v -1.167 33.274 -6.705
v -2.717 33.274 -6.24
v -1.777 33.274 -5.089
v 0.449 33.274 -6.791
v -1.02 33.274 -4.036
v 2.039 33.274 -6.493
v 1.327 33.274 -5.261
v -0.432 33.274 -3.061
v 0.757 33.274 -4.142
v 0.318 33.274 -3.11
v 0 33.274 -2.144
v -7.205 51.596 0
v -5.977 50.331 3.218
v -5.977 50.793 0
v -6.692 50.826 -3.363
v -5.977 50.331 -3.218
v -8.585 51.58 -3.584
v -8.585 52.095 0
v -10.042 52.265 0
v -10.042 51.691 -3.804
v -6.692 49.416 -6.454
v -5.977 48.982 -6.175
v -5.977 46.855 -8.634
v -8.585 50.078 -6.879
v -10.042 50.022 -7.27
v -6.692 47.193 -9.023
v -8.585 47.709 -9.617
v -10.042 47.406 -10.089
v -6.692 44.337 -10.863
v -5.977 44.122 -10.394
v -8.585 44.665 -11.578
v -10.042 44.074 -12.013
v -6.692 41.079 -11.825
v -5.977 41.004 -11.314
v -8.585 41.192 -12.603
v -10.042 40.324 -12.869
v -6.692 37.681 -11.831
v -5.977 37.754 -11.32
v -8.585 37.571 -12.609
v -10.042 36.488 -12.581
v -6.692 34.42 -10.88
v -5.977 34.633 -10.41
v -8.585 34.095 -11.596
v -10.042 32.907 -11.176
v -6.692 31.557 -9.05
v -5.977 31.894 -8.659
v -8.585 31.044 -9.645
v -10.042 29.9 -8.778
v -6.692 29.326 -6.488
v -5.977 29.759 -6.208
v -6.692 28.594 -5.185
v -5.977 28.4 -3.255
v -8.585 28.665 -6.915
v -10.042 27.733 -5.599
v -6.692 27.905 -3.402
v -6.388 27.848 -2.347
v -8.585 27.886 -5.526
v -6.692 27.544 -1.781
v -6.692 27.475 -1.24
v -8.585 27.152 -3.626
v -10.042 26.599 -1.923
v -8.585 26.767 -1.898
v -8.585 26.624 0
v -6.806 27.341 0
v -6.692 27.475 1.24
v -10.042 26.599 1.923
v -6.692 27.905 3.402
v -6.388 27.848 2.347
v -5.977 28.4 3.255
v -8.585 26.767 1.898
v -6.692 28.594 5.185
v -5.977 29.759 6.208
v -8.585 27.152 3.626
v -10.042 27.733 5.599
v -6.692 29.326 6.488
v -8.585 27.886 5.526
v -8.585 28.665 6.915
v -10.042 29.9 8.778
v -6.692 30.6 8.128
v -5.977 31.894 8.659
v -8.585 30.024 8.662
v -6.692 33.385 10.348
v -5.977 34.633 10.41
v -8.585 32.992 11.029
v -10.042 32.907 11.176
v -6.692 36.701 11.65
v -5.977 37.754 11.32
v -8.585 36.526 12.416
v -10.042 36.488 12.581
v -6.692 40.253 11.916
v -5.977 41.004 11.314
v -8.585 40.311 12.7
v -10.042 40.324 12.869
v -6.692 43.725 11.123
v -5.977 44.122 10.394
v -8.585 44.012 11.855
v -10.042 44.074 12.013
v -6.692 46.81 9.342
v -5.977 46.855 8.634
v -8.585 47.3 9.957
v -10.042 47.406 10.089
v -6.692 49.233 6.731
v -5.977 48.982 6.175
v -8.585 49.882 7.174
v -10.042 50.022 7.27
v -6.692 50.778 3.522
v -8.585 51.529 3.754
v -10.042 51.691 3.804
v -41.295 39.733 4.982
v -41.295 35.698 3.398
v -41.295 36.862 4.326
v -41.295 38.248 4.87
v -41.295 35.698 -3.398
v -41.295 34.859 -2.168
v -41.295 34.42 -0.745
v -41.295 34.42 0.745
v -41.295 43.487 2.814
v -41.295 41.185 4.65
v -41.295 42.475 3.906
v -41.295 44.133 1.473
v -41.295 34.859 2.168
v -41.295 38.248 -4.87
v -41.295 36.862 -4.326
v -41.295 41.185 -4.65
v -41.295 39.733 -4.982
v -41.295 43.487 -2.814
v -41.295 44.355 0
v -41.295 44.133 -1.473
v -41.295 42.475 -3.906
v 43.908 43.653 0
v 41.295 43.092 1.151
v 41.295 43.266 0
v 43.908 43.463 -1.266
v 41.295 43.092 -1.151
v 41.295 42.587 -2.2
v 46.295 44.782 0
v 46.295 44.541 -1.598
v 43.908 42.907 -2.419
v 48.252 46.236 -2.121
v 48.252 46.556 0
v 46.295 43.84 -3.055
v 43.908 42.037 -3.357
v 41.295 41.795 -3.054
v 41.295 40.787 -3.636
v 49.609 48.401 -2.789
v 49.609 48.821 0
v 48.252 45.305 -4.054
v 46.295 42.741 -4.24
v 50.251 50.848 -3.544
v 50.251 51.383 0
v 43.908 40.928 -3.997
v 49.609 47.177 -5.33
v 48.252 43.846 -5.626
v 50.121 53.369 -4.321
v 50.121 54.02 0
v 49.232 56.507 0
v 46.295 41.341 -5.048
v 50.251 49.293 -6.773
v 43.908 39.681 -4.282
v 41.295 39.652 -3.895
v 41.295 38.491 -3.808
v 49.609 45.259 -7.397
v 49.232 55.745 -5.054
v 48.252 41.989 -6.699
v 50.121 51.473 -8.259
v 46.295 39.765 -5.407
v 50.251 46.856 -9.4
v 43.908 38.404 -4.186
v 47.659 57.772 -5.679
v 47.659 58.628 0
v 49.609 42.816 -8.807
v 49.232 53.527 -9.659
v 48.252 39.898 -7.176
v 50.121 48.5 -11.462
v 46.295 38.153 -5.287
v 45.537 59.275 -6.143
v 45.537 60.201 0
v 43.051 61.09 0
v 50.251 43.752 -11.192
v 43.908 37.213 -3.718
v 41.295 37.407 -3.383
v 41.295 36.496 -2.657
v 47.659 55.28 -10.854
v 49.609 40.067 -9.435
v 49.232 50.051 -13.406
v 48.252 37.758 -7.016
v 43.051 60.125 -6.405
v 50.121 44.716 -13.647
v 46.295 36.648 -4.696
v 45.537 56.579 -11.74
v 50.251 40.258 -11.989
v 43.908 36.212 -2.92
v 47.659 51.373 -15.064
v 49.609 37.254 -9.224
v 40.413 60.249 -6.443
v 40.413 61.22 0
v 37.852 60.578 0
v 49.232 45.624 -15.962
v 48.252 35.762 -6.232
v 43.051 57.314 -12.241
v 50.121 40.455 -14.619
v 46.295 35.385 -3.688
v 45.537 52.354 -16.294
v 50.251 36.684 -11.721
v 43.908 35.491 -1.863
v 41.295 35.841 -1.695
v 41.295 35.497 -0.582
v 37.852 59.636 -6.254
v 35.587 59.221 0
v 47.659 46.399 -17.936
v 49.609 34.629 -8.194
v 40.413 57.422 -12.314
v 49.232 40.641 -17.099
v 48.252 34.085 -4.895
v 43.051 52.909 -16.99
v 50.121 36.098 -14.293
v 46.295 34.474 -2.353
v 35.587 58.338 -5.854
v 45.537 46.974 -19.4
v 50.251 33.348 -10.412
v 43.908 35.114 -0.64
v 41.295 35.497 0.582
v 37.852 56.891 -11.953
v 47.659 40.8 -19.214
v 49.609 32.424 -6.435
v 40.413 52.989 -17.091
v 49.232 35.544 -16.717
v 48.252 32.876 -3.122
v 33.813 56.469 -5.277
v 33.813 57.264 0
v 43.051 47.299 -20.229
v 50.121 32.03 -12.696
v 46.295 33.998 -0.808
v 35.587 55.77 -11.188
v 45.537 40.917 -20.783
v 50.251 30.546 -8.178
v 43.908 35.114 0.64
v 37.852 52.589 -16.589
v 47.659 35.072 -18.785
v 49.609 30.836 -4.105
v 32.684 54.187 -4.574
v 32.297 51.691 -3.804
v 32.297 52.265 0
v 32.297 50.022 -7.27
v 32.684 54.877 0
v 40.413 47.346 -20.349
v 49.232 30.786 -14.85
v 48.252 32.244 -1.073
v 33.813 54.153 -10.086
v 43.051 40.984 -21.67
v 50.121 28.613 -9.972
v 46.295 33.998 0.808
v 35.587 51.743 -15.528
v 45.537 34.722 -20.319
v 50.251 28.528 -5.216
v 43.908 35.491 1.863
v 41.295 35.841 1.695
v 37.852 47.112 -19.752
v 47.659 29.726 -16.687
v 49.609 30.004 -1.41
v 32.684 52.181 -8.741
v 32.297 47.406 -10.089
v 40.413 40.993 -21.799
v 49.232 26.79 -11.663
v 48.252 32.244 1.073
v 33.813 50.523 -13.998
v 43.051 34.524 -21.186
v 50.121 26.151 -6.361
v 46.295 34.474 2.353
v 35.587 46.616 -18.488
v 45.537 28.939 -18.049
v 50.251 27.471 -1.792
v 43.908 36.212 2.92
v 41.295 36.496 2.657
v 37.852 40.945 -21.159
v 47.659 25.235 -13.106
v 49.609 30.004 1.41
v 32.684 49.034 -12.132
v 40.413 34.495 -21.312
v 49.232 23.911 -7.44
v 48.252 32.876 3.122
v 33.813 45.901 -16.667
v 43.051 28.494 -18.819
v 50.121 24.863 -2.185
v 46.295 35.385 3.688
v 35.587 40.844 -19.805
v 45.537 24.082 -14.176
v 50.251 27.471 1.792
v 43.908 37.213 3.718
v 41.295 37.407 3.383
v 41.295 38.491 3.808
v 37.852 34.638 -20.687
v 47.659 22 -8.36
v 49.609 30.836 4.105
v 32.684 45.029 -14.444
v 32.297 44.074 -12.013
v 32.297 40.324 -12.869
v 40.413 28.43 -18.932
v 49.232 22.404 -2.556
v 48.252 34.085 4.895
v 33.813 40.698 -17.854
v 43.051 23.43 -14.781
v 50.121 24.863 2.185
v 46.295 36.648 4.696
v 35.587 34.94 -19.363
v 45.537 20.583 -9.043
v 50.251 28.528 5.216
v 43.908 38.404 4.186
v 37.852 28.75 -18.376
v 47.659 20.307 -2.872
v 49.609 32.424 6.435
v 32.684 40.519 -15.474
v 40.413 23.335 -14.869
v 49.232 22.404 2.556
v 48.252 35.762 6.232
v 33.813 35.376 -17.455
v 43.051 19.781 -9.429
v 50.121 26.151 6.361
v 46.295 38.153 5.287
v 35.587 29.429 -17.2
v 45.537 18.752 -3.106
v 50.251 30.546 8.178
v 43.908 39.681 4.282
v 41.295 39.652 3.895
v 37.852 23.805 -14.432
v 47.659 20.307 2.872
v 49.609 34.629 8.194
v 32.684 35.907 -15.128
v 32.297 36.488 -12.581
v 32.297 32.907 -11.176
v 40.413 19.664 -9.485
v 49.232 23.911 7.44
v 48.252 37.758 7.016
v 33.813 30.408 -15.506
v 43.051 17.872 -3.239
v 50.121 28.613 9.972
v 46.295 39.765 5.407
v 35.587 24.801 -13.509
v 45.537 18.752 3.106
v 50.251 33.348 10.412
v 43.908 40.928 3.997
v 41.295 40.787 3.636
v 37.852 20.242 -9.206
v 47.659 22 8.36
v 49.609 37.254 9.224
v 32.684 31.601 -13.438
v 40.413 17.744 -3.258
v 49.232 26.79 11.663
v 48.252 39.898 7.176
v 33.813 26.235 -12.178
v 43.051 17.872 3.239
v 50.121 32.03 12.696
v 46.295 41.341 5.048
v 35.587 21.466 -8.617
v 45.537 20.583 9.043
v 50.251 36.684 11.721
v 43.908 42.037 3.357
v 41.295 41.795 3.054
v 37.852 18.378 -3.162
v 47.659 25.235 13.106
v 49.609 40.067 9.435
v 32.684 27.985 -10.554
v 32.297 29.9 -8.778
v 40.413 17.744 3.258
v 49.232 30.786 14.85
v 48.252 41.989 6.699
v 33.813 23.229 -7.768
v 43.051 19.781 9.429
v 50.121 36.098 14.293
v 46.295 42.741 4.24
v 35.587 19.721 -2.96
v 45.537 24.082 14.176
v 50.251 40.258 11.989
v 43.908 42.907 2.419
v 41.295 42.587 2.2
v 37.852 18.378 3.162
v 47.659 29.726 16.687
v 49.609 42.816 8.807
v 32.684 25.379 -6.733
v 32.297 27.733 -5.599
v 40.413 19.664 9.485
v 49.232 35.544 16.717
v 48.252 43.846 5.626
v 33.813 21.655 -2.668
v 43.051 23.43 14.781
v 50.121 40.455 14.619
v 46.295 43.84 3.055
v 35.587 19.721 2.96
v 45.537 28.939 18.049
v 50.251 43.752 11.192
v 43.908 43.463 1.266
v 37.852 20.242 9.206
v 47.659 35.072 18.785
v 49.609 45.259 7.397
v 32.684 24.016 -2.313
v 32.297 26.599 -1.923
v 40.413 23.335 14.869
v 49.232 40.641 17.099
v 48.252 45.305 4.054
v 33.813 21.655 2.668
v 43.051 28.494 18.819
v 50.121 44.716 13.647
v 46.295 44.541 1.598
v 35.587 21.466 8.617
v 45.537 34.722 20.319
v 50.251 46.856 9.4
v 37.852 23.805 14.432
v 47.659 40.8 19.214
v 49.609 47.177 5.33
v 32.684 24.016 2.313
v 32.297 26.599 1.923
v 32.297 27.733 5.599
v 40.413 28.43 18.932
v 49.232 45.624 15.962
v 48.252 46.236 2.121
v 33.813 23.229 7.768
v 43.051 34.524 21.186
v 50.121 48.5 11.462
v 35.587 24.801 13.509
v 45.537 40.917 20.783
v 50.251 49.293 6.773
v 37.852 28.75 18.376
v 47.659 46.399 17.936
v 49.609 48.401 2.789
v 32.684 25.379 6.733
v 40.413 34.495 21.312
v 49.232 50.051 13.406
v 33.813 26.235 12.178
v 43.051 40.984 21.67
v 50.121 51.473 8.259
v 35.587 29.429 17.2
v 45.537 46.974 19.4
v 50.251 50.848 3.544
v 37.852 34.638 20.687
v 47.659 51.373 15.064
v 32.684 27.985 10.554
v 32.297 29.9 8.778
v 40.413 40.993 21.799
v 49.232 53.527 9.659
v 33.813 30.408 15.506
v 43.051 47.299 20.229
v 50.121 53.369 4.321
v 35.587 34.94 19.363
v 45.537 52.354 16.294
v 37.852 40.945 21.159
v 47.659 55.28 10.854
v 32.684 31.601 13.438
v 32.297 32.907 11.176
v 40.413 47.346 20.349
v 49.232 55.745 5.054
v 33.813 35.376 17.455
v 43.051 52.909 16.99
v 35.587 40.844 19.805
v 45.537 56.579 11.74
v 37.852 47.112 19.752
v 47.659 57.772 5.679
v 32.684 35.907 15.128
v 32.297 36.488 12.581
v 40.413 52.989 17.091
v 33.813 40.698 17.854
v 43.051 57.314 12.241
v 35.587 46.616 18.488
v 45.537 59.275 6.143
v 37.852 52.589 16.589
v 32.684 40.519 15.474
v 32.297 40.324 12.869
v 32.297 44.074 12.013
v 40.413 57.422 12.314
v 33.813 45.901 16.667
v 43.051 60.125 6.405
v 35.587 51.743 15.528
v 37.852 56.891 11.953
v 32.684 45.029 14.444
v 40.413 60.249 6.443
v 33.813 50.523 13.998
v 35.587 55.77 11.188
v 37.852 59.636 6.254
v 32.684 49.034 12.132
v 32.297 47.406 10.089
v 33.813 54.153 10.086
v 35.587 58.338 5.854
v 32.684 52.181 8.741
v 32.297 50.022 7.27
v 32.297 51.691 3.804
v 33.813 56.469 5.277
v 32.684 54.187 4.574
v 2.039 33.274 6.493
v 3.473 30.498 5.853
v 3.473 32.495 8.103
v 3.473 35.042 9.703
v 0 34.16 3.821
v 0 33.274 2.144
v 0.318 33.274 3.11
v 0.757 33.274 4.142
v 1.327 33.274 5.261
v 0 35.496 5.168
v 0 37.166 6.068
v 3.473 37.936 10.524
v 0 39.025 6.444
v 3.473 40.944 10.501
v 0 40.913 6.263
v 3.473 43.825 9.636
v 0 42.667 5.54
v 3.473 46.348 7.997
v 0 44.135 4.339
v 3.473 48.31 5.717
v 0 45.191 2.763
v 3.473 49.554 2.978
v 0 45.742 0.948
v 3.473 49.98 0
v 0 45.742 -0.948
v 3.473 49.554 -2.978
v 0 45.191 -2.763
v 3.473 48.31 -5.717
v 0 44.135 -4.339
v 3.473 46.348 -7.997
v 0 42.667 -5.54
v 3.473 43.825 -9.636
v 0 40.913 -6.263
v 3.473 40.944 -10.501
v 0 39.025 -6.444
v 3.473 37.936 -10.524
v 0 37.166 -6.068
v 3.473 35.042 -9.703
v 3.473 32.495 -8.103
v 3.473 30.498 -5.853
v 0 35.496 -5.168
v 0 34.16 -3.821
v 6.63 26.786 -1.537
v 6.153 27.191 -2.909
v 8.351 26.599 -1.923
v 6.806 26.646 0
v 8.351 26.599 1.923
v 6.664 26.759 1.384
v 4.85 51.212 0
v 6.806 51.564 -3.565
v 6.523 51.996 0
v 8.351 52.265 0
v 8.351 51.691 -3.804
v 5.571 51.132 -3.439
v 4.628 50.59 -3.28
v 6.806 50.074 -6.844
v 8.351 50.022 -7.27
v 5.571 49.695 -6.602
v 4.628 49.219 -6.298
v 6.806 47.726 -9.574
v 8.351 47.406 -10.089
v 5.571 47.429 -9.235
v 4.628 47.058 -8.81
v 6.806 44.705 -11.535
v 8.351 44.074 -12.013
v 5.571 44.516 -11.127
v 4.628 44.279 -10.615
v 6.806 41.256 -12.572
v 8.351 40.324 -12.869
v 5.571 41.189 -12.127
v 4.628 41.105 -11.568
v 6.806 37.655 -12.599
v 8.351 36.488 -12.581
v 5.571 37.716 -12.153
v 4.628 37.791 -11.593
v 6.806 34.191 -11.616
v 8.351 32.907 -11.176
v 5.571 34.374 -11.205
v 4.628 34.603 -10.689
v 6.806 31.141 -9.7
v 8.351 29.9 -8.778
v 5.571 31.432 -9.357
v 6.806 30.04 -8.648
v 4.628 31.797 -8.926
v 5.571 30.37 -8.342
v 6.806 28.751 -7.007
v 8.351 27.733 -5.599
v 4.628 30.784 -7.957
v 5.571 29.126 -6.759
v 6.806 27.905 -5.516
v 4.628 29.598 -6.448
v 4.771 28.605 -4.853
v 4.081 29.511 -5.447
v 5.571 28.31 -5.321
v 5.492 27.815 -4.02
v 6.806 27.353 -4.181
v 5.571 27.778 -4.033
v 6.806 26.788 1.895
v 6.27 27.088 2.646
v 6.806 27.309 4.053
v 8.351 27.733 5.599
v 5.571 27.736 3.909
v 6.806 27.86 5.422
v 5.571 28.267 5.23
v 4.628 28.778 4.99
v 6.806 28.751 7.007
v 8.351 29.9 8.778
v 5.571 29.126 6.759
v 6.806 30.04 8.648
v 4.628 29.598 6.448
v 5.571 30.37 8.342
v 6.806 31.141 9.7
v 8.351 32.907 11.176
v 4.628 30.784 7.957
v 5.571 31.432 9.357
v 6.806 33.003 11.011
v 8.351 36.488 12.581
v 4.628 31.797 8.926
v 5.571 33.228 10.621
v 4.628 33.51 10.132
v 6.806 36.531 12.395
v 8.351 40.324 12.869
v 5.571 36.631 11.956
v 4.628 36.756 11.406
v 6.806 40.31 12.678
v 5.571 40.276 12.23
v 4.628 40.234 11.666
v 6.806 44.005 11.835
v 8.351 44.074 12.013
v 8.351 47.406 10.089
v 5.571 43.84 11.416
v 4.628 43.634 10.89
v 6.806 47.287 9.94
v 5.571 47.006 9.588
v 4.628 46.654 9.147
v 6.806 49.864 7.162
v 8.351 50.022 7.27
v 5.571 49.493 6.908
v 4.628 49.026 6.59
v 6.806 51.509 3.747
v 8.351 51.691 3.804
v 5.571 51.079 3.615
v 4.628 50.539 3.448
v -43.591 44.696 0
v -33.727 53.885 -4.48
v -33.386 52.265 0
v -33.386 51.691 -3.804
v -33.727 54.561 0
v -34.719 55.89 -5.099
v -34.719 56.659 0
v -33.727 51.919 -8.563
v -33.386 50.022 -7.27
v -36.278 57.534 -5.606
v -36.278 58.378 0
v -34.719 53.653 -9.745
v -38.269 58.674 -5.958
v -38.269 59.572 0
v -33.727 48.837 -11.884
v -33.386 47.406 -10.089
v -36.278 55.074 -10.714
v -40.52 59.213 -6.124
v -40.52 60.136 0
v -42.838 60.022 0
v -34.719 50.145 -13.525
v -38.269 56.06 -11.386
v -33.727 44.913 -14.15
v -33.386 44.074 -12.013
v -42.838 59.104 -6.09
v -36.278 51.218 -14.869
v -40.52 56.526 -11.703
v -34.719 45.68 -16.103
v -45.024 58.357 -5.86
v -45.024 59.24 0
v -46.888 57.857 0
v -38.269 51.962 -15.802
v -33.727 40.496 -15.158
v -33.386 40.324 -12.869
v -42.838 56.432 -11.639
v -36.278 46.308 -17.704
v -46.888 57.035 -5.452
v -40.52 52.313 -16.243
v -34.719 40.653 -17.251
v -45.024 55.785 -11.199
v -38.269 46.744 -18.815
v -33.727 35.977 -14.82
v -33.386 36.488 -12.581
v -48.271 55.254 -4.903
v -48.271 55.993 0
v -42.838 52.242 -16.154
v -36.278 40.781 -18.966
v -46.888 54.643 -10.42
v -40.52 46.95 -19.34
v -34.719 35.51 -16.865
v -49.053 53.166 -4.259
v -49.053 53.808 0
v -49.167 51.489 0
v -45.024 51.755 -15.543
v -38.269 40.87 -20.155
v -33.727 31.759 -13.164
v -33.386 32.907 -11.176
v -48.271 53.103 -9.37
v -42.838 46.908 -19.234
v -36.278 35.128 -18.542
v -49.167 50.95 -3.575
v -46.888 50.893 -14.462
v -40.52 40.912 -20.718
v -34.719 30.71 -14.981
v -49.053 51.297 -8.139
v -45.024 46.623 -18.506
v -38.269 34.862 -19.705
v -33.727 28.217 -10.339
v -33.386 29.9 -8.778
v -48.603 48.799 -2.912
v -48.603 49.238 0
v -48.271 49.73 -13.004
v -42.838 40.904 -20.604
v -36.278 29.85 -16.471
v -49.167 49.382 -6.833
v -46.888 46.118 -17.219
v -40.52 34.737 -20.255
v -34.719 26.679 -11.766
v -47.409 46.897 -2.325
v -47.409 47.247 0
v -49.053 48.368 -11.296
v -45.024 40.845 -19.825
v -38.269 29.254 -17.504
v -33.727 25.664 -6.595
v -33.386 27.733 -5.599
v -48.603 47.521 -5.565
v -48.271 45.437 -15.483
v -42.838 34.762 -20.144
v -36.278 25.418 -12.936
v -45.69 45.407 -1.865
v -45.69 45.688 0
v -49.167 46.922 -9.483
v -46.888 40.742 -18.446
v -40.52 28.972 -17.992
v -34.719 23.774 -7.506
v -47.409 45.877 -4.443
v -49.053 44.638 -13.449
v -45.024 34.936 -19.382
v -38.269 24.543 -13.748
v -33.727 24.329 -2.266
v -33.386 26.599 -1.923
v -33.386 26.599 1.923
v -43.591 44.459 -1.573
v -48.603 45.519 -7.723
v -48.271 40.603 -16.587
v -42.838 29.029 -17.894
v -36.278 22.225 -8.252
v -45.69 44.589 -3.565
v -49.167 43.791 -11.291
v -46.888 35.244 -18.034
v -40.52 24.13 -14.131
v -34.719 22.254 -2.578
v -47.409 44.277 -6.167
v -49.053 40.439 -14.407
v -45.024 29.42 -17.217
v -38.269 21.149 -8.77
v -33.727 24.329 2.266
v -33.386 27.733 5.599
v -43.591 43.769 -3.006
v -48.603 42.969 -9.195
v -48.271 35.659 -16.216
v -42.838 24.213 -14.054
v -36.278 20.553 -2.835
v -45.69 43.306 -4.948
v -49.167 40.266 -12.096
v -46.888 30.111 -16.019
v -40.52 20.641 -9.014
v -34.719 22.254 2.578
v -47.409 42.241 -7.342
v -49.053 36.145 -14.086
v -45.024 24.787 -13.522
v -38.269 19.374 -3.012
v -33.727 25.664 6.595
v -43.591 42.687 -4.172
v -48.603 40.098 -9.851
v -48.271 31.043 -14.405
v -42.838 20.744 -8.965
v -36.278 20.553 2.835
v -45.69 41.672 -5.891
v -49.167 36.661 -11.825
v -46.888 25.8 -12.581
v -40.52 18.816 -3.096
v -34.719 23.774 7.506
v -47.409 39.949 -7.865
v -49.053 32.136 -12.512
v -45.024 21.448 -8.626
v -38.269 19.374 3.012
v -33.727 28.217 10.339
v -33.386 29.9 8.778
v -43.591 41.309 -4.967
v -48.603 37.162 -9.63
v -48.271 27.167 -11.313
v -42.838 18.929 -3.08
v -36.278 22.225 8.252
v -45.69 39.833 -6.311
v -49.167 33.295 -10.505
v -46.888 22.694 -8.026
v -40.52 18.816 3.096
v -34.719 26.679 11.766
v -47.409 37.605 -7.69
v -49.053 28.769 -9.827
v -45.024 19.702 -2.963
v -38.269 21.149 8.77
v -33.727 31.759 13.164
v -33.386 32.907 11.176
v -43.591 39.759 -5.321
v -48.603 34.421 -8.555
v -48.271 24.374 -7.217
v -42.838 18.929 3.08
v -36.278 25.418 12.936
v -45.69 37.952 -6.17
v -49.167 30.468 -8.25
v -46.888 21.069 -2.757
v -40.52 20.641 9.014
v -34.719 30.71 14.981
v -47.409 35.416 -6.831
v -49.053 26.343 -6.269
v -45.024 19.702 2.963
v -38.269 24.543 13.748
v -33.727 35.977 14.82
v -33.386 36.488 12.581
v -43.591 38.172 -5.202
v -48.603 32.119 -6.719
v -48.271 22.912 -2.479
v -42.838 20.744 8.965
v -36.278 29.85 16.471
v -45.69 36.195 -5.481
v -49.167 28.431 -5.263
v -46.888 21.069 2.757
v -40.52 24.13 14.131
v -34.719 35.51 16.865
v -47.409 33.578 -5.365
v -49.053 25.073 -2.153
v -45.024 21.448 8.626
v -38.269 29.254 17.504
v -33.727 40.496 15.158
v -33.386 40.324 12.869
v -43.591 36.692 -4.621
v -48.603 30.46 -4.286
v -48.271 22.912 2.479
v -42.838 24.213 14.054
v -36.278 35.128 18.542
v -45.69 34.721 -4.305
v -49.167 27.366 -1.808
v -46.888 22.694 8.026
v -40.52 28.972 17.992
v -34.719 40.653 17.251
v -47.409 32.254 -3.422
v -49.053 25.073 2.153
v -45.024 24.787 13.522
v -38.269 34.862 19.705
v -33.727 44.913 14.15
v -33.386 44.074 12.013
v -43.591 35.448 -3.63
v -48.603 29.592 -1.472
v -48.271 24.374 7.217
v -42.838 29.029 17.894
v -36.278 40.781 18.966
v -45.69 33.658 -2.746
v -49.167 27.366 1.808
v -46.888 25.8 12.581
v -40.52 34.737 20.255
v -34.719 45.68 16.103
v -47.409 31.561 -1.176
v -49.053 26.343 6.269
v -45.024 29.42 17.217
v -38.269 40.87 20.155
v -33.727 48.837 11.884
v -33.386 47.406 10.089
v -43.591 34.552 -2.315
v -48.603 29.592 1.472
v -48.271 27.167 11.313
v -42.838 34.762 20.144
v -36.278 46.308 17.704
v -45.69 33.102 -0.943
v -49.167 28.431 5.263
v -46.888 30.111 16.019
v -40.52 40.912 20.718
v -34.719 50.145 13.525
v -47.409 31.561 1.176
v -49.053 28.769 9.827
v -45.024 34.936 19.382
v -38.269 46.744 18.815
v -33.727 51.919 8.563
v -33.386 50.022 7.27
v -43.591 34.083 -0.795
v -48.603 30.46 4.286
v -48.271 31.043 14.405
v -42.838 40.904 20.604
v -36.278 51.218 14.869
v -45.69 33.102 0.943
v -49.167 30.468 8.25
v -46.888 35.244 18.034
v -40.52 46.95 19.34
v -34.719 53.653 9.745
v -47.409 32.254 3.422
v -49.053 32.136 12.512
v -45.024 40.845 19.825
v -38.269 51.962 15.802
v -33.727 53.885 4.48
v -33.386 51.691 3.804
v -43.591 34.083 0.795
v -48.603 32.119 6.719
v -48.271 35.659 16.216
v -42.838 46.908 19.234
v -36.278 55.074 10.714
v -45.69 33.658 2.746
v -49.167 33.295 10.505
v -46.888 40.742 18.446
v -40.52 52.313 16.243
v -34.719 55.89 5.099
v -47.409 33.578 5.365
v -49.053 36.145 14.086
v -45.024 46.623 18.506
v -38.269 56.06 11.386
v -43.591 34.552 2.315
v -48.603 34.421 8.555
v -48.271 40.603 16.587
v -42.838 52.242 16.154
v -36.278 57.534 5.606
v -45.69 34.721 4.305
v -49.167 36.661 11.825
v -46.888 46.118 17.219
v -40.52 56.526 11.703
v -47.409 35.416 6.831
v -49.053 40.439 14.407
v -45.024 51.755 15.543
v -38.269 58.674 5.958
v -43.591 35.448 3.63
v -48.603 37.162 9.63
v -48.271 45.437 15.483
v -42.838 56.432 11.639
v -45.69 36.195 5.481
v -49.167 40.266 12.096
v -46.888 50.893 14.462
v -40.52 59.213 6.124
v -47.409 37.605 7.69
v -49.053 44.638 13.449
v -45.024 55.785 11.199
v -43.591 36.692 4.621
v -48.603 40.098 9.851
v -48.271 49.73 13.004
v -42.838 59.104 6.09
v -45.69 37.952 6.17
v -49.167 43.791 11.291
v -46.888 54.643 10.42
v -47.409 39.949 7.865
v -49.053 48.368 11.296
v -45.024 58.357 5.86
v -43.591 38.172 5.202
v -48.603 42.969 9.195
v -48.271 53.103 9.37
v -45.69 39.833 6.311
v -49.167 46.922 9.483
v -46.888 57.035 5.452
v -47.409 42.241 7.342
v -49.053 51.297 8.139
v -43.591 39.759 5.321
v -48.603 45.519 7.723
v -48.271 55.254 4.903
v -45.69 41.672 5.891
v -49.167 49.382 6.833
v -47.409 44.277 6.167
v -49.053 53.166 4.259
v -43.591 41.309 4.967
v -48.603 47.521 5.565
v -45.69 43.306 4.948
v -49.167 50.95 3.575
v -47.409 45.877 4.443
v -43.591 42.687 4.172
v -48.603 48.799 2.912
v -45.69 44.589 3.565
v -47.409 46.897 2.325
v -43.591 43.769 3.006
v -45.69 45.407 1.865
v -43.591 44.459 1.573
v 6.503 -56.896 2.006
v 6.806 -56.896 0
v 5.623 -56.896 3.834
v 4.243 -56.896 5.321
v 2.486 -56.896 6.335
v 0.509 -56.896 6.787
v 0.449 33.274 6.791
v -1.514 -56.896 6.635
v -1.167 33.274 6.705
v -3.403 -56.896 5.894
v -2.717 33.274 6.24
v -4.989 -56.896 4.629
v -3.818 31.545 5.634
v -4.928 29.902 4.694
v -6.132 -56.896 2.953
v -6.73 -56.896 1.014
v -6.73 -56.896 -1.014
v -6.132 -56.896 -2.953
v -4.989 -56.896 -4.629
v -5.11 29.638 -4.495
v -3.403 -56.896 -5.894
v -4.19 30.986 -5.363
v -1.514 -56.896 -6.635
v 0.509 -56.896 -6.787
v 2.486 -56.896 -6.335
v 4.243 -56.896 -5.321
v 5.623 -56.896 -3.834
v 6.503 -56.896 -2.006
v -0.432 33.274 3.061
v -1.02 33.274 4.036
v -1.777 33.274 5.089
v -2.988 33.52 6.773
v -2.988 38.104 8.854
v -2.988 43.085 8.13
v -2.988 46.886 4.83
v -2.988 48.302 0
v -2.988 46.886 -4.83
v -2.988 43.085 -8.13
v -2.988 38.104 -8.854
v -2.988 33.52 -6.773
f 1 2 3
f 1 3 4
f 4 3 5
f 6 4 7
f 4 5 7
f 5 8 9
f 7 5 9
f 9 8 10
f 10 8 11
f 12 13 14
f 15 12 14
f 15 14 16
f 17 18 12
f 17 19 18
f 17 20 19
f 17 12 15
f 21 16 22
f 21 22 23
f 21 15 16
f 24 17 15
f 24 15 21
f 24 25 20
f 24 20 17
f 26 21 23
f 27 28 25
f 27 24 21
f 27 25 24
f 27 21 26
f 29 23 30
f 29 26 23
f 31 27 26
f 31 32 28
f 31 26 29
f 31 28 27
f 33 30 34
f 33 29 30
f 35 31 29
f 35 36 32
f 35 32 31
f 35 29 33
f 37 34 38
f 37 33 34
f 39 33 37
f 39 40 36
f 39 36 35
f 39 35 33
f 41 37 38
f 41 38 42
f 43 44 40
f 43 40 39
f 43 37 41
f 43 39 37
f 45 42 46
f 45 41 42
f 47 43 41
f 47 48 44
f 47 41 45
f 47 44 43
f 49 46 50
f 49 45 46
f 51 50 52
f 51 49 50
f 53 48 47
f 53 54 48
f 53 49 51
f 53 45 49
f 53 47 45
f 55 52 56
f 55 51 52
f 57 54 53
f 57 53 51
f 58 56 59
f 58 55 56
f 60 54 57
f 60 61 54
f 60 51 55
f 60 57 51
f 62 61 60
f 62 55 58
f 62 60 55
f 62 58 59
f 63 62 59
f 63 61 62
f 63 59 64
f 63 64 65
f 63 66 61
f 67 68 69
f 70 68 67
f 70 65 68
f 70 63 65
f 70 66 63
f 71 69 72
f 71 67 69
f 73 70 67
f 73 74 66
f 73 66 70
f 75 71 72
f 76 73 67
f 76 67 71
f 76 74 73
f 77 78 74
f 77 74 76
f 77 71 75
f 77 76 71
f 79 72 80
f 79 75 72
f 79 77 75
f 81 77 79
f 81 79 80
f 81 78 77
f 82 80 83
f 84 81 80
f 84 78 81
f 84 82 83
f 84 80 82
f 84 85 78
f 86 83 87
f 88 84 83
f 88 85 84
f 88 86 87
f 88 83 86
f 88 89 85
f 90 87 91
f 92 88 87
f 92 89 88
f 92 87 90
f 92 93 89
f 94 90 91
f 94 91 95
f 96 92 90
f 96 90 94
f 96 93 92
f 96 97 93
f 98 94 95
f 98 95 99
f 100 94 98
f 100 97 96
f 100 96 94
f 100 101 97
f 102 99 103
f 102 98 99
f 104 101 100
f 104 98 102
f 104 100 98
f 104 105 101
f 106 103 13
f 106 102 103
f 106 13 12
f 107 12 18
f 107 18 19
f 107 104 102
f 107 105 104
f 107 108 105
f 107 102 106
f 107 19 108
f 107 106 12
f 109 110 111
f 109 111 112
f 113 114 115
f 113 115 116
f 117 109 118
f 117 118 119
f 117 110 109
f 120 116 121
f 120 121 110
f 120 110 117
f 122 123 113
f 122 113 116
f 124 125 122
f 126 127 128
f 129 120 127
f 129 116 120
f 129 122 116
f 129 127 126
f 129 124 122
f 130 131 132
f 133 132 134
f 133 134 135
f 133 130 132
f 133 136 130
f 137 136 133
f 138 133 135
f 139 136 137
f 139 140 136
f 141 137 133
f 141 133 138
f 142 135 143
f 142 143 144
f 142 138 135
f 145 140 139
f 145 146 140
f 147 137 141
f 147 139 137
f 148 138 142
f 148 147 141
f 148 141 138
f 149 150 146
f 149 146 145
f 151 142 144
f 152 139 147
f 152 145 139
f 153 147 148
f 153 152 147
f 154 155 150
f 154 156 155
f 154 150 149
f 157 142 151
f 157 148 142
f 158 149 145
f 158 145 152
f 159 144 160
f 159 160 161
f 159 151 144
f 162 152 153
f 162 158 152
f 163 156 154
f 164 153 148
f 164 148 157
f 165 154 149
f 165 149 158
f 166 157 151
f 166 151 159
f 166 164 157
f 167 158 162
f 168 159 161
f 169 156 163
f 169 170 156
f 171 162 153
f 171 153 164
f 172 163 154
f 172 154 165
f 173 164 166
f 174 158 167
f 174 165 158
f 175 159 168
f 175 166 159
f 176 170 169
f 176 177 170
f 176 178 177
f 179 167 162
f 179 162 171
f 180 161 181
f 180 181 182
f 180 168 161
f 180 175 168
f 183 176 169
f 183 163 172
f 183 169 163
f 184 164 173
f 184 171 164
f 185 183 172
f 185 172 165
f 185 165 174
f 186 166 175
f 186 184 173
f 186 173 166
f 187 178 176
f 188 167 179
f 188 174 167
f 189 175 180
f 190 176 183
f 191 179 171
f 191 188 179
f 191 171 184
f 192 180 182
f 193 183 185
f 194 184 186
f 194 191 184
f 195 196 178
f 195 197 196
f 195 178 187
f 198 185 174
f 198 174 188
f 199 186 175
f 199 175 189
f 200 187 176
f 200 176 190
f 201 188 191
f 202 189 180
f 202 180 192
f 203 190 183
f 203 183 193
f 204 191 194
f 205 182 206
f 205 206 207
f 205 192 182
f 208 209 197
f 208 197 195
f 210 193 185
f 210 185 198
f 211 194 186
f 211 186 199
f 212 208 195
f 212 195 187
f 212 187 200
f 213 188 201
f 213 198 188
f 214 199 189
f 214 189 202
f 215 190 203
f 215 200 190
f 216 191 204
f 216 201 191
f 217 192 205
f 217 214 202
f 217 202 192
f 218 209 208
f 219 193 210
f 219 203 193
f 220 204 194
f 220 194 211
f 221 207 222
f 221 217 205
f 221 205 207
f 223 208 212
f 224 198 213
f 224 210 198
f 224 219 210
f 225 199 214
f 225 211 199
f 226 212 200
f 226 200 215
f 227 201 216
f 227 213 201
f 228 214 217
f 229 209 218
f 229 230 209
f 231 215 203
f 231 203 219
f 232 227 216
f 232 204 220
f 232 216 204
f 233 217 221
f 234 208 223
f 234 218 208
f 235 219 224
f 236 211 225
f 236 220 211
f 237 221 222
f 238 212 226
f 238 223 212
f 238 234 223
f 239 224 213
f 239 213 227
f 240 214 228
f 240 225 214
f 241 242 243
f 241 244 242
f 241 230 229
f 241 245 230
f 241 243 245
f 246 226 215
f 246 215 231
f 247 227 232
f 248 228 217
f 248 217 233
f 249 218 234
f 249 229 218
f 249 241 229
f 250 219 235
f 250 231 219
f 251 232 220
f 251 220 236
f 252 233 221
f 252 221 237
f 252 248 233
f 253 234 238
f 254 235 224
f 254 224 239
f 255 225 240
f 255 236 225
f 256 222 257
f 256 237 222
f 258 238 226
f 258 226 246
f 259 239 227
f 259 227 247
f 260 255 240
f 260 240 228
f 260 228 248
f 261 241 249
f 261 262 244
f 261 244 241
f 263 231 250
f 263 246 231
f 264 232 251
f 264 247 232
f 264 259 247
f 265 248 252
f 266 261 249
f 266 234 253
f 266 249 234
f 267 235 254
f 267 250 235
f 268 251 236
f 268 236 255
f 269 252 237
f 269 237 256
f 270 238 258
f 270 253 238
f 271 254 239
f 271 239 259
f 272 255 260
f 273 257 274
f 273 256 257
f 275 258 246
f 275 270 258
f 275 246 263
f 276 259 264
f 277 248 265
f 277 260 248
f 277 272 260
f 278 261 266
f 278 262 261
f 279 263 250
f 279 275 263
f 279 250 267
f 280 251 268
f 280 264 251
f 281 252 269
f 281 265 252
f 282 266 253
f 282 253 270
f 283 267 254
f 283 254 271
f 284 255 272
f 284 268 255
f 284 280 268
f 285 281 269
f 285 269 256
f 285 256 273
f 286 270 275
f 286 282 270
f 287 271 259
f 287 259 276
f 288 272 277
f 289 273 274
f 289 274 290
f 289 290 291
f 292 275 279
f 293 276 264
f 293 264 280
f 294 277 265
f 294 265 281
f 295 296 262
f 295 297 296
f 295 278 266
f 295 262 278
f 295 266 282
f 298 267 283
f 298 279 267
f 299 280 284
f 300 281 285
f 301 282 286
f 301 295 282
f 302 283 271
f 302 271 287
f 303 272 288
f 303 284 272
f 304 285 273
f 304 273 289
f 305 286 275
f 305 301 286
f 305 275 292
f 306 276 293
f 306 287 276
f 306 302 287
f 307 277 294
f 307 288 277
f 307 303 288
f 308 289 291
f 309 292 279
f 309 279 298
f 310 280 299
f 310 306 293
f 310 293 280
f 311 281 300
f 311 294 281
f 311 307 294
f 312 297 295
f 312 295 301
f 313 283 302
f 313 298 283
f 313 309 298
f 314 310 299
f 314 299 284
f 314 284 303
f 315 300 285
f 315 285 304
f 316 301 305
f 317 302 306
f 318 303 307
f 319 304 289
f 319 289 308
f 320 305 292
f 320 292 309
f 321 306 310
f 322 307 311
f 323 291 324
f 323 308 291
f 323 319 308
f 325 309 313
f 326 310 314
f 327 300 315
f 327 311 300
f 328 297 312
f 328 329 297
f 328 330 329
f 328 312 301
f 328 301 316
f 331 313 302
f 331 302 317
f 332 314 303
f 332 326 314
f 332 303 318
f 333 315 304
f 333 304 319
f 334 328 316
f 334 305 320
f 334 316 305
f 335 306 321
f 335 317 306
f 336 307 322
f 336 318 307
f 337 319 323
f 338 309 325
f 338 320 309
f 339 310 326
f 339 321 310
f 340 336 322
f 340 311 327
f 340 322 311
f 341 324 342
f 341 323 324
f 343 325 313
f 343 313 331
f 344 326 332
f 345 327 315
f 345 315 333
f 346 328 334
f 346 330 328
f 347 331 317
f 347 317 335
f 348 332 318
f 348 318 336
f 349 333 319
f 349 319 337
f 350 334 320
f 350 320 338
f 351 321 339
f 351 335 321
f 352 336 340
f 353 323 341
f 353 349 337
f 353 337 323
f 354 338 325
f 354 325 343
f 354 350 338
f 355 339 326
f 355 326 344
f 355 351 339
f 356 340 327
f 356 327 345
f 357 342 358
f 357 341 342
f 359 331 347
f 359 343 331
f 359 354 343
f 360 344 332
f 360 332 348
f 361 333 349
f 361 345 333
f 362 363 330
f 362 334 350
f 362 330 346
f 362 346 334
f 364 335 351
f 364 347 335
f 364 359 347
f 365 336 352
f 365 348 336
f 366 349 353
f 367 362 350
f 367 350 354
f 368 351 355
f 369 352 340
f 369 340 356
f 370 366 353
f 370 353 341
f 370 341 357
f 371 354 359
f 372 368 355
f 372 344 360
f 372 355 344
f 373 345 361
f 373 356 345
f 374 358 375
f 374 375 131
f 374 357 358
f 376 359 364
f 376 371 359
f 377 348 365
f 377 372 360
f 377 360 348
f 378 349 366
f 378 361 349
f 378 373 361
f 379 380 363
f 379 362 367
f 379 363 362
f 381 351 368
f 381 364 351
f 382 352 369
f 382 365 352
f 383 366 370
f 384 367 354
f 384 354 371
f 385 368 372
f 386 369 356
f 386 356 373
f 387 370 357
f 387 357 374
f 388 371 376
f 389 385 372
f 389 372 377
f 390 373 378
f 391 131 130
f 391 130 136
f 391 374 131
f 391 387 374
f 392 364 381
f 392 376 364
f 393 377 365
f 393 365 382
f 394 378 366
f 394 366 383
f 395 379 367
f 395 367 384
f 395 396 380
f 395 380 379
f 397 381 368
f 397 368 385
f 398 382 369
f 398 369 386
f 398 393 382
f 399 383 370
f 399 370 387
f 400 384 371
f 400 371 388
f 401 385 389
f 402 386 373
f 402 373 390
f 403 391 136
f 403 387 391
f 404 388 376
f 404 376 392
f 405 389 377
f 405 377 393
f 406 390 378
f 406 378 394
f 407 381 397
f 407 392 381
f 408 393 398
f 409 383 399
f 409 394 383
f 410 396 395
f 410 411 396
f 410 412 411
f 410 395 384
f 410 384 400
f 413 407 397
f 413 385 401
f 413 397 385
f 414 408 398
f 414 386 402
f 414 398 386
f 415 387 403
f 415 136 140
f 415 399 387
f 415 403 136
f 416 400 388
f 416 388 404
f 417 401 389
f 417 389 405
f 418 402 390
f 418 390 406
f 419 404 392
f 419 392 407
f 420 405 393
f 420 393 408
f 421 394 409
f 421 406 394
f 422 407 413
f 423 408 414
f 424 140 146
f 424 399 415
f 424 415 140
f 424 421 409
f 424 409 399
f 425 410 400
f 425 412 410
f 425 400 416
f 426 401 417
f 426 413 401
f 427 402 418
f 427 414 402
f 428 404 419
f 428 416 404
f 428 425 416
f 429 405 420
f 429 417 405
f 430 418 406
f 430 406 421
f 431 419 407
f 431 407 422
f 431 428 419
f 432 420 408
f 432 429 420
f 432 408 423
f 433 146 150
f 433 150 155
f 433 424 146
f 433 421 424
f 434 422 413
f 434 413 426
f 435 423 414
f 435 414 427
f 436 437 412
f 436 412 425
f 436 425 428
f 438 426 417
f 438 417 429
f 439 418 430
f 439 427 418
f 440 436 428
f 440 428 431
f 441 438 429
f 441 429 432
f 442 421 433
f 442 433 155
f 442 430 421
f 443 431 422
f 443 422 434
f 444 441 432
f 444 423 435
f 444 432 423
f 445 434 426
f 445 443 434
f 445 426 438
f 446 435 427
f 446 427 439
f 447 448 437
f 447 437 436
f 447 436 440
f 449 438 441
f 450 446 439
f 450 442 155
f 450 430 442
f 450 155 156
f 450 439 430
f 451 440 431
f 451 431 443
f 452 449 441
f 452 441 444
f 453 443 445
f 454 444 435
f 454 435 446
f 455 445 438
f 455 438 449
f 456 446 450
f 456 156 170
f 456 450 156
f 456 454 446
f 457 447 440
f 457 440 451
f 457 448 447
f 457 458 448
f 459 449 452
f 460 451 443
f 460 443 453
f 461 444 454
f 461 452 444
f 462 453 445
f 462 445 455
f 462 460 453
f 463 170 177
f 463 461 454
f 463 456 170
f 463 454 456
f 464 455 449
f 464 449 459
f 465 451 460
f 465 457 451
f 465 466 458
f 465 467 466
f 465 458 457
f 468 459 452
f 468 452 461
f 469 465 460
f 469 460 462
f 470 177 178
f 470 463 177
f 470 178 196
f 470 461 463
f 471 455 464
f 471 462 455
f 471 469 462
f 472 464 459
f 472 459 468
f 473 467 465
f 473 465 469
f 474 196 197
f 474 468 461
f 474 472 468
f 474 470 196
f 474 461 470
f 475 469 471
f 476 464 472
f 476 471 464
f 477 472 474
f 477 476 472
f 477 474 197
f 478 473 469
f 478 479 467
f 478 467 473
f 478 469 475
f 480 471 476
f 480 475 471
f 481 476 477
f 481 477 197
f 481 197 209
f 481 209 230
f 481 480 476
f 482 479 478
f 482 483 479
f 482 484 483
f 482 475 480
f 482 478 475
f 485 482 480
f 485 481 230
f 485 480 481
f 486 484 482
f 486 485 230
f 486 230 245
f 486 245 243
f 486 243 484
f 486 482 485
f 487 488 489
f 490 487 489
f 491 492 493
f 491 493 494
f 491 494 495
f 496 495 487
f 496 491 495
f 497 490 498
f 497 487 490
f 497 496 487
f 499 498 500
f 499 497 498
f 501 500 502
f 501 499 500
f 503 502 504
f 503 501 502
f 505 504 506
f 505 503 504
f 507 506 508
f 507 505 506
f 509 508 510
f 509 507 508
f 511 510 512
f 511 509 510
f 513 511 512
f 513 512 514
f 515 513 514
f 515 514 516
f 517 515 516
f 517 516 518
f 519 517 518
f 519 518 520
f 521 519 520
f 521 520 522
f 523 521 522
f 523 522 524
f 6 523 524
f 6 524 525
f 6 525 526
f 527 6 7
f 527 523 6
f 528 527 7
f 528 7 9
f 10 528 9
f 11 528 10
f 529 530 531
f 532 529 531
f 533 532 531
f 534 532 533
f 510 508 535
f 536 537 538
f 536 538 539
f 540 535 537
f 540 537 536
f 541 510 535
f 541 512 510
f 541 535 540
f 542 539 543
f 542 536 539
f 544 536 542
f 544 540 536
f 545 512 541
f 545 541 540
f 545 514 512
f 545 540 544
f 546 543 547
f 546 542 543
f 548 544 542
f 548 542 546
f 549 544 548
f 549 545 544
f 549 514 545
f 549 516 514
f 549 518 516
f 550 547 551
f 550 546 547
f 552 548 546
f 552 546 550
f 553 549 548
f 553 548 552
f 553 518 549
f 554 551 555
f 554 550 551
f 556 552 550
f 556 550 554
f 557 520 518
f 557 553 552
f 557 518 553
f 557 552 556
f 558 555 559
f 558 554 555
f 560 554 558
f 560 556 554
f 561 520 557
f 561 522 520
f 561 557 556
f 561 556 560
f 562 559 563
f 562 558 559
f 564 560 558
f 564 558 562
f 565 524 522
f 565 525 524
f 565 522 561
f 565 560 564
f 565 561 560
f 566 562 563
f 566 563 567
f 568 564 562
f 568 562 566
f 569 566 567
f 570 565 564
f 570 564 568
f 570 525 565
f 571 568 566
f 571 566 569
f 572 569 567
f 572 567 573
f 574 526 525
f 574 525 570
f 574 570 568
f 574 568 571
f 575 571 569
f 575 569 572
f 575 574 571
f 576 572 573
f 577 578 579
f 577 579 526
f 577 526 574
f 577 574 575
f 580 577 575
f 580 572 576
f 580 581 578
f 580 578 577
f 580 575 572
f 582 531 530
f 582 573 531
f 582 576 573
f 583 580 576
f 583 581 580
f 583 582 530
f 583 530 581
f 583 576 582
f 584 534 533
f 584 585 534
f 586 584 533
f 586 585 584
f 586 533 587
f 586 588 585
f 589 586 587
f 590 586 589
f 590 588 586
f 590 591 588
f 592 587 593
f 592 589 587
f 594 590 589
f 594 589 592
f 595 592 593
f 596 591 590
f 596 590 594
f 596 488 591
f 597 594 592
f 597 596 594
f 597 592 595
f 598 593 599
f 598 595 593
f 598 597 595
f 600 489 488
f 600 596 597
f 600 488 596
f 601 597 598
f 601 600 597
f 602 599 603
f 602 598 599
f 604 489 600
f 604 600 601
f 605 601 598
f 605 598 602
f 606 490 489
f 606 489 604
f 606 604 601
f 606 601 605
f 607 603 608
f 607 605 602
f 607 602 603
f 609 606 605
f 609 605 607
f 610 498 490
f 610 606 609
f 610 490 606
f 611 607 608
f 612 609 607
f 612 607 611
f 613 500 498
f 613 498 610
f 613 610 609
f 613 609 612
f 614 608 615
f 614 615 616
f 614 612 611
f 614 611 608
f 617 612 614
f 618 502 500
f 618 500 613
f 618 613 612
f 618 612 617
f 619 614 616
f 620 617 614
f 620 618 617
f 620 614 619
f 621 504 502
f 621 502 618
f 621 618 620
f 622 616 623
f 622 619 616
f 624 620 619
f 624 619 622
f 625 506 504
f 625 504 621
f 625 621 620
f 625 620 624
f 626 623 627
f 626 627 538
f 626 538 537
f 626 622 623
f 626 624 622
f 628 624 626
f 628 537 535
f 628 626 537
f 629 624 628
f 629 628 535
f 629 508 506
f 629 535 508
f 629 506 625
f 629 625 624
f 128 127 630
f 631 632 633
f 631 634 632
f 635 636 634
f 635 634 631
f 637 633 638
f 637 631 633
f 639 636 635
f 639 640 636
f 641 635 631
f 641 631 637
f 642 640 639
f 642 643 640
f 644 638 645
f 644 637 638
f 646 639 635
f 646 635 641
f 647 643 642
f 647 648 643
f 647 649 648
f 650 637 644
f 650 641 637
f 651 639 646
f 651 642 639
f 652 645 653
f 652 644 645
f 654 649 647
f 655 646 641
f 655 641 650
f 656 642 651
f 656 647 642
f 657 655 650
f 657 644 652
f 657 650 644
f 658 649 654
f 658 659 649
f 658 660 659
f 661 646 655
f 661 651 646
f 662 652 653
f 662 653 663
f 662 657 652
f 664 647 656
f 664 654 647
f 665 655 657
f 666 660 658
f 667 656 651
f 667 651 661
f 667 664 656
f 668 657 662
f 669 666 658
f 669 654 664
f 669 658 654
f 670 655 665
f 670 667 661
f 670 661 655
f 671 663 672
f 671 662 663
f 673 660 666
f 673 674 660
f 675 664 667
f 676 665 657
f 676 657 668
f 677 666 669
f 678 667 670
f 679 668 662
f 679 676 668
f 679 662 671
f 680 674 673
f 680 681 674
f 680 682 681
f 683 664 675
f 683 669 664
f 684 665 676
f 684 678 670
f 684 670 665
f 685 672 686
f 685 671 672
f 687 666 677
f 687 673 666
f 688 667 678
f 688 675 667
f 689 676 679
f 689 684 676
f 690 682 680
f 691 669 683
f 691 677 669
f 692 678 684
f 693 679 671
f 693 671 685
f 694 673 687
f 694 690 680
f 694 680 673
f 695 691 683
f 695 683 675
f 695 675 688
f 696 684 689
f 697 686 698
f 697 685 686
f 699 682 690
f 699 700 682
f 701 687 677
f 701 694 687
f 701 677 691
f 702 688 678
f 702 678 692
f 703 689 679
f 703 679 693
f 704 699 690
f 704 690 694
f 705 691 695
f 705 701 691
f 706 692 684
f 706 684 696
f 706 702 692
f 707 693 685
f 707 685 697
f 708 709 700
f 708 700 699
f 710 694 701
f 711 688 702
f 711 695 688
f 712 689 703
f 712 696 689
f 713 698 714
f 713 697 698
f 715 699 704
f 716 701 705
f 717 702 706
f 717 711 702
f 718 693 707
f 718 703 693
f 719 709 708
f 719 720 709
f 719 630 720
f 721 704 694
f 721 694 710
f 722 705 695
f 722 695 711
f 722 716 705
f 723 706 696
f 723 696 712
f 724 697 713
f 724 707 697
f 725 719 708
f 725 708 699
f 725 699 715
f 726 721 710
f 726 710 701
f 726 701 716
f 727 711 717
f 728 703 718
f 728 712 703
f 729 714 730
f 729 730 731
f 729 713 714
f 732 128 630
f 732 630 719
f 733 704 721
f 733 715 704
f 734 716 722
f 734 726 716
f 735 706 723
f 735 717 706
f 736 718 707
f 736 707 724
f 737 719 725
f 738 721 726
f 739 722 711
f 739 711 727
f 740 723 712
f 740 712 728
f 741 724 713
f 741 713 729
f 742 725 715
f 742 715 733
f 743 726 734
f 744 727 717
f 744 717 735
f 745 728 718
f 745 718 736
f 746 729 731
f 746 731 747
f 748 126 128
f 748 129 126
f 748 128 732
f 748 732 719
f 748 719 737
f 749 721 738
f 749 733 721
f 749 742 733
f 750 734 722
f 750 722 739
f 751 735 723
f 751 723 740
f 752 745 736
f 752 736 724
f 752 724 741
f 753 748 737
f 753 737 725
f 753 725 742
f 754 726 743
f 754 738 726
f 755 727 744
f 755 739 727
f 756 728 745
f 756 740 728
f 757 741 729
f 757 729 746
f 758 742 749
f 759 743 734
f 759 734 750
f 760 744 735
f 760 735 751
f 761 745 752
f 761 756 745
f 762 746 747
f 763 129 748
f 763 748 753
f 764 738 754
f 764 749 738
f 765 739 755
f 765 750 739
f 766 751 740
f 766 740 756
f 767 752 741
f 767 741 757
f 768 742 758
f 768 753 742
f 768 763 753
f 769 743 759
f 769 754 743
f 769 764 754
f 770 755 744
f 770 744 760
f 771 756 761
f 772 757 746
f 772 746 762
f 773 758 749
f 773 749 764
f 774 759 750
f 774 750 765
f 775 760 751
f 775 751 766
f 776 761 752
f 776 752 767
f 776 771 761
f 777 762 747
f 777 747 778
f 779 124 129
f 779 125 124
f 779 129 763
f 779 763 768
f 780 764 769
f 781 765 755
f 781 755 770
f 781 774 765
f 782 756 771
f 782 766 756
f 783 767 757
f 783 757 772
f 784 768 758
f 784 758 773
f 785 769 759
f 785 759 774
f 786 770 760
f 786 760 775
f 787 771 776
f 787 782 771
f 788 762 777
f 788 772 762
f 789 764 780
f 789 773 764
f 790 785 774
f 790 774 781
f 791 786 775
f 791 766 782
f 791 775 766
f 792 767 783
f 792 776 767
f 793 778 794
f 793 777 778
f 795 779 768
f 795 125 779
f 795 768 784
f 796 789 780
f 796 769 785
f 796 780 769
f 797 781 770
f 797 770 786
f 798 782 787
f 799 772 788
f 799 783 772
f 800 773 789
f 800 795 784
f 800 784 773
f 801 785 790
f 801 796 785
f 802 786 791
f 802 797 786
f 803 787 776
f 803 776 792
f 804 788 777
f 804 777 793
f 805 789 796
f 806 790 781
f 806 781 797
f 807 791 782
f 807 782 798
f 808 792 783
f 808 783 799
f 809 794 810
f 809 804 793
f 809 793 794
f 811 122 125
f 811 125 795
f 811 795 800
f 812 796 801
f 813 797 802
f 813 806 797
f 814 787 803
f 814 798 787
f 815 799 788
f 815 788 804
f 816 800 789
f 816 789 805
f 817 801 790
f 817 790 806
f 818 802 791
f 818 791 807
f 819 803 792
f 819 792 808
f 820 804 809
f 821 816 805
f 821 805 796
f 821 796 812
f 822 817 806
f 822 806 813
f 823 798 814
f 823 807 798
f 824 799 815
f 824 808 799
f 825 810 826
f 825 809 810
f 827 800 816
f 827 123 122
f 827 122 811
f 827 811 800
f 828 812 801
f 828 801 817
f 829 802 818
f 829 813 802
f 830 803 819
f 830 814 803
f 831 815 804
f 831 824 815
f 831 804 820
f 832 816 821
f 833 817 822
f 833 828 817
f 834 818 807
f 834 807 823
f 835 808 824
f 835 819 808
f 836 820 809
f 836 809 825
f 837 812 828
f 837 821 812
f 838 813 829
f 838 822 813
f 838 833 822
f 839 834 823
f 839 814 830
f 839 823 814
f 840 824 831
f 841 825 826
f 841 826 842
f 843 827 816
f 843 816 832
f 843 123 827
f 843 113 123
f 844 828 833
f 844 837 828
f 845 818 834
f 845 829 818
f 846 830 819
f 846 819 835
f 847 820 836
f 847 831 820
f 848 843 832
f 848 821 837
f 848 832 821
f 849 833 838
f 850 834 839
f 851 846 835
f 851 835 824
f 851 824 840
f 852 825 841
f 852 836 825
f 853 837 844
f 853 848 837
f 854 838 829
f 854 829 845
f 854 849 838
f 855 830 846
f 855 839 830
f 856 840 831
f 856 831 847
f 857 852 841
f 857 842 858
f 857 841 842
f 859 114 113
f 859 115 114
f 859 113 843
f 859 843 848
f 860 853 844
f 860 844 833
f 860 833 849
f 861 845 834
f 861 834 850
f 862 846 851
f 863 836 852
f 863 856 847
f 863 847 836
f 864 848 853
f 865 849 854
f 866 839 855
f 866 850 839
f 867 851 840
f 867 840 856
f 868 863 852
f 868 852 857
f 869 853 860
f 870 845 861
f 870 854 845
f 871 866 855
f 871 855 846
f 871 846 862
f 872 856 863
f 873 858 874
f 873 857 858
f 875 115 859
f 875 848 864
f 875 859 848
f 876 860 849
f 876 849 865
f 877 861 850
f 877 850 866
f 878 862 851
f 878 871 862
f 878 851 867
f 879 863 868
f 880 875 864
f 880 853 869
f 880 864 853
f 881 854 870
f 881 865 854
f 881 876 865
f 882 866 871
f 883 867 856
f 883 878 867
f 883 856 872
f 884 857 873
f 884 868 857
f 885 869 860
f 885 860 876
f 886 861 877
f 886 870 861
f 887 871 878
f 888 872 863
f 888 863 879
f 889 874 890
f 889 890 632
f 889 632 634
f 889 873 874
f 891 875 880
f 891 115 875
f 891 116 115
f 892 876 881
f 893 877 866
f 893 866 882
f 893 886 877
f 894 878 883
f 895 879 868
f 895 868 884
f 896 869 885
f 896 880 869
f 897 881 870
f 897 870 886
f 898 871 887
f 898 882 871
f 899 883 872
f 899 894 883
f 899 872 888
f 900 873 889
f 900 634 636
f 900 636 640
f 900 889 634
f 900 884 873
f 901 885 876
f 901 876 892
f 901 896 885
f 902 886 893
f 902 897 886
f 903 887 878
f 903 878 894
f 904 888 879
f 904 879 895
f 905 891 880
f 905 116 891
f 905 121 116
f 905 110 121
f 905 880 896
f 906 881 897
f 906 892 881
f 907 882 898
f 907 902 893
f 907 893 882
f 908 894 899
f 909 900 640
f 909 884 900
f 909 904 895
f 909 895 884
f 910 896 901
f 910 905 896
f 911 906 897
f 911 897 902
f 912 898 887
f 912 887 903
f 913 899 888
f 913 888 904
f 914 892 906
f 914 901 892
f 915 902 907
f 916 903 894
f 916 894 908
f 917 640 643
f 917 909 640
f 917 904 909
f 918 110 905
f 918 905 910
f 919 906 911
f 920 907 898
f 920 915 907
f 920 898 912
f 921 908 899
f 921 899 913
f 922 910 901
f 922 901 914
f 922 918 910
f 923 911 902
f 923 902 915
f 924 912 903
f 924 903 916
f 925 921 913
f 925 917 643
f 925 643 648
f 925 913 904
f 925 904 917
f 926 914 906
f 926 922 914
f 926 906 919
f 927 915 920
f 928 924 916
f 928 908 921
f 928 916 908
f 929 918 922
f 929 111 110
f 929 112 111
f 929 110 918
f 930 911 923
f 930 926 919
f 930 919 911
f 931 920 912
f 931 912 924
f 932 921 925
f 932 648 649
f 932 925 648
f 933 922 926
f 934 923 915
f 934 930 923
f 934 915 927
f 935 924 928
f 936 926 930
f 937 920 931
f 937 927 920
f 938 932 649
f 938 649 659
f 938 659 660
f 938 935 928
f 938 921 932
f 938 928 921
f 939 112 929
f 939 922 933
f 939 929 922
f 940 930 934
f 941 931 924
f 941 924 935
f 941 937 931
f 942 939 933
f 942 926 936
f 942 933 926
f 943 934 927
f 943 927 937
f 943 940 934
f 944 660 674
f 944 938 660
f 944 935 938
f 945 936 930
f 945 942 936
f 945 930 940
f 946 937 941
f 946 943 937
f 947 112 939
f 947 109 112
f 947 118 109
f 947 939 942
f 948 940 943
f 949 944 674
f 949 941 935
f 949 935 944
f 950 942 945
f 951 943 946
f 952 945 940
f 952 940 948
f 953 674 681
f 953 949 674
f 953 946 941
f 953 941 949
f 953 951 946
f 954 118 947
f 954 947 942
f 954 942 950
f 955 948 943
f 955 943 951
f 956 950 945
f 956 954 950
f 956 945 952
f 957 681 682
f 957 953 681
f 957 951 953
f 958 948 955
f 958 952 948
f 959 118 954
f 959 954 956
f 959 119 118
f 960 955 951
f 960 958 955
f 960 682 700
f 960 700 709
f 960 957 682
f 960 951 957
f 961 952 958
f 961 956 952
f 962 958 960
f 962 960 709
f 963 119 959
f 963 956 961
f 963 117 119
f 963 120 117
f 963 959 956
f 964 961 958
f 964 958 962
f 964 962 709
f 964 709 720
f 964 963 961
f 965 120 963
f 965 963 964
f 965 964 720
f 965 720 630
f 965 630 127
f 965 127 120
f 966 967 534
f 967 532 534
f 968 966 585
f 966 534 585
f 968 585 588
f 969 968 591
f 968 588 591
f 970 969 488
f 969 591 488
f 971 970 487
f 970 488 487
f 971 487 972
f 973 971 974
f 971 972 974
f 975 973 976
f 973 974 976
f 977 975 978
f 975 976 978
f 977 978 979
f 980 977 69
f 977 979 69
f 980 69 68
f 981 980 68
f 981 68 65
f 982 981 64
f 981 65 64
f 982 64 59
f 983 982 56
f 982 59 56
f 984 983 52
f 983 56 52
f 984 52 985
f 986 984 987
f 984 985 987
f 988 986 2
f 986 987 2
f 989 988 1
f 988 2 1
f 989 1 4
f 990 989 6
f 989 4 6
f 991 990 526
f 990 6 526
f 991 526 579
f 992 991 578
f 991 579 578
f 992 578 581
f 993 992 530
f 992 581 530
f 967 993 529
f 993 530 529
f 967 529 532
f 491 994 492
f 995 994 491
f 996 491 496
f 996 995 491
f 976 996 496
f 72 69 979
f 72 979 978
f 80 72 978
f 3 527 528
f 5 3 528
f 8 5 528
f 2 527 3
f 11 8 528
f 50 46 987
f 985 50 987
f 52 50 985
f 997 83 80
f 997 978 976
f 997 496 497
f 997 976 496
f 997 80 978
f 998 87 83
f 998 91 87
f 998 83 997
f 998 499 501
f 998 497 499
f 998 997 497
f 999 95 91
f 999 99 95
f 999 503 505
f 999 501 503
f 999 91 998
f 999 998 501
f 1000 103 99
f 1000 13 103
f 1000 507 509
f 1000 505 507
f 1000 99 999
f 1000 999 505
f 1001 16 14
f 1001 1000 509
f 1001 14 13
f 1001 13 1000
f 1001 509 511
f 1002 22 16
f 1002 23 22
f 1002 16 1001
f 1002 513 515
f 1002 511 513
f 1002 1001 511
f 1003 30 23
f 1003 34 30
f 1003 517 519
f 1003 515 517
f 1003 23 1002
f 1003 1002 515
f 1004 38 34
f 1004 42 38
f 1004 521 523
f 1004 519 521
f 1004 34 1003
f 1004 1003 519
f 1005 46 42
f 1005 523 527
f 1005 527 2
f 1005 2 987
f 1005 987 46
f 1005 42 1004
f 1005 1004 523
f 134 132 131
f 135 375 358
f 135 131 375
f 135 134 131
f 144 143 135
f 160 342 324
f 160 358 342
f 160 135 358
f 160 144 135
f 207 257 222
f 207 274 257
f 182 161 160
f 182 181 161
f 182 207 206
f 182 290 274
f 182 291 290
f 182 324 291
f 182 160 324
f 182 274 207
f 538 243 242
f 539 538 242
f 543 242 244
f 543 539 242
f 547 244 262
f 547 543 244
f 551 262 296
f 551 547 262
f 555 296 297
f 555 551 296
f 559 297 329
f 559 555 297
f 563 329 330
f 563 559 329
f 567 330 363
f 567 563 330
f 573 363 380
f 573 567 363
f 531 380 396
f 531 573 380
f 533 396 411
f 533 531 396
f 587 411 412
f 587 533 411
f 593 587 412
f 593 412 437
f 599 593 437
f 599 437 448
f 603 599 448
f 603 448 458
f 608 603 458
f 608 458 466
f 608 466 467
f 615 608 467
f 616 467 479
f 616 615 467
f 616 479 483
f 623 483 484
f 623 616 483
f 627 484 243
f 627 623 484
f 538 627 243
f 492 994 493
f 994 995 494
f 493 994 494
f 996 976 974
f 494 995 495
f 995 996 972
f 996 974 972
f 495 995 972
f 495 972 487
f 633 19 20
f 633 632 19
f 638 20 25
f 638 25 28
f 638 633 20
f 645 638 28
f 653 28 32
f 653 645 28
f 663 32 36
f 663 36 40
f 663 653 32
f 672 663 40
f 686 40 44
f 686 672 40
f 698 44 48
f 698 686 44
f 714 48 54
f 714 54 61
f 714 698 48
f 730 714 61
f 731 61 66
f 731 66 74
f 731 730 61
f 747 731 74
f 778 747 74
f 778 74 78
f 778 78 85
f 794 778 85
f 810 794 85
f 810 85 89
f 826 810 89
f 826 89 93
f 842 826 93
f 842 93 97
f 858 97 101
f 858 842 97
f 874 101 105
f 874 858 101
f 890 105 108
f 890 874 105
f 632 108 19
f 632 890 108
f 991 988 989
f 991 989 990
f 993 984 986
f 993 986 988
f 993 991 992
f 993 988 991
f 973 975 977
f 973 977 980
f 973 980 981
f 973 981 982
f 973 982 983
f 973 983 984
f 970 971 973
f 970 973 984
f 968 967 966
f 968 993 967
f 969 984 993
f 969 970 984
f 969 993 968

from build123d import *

# Parameters (mm, degrees)
F2_R     = 6.805697
F3_DEPTH = 33.274
F4_DEPTH = 56.896


with BuildPart() as f1:
    # F0 (on Top) → F1 (revolve)
    with BuildSketch(Plane.XY):
        with BuildLine():
            Line((-41.295487, 39.35976), (41.295487, 39.35976))
            Line((41.295487, 39.35976), (41.295487, 43.265841))
            ThreePointArc((41.295487, 43.265841), (47.658569, 58.627679), (32.296731, 52.264597))
            Line((32.296731, 52.264597), (8.351196, 52.264597))
            ThreePointArc((8.351196, 52.264597), (5.657809, 51.66509), (3.47299, 49.979768))
            Line((3.47299, 49.979768), (0, 45.812178))
            Line((0, 45.812178), (-5.976751, 50.792803))
            ThreePointArc((-5.976751, 50.792803), (-7.880221, 51.885322), (-10.041921, 52.264597))
            Line((-10.041921, 52.264597), (-33.386332, 52.264597))
            ThreePointArc((-33.386332, 52.264597), (-46.888105, 57.857214), (-41.295487, 44.355442))
            Line((-41.295487, 44.355442), (-41.295487, 39.35976))
        make_face()
    revolve(axis=Axis((0, 39.35976, 0), (-1, 0, 0)))

    # F2 (on Front) → F3 (join)
    with BuildSketch(Plane.XZ):
        Circle(F2_R)
    extrude(amount=-F3_DEPTH)

    # F2 (on Front) → F4 (join)
    with BuildSketch(Plane.XZ):
        Circle(F2_R)
    extrude(amount=F4_DEPTH)


solid = f1.part
